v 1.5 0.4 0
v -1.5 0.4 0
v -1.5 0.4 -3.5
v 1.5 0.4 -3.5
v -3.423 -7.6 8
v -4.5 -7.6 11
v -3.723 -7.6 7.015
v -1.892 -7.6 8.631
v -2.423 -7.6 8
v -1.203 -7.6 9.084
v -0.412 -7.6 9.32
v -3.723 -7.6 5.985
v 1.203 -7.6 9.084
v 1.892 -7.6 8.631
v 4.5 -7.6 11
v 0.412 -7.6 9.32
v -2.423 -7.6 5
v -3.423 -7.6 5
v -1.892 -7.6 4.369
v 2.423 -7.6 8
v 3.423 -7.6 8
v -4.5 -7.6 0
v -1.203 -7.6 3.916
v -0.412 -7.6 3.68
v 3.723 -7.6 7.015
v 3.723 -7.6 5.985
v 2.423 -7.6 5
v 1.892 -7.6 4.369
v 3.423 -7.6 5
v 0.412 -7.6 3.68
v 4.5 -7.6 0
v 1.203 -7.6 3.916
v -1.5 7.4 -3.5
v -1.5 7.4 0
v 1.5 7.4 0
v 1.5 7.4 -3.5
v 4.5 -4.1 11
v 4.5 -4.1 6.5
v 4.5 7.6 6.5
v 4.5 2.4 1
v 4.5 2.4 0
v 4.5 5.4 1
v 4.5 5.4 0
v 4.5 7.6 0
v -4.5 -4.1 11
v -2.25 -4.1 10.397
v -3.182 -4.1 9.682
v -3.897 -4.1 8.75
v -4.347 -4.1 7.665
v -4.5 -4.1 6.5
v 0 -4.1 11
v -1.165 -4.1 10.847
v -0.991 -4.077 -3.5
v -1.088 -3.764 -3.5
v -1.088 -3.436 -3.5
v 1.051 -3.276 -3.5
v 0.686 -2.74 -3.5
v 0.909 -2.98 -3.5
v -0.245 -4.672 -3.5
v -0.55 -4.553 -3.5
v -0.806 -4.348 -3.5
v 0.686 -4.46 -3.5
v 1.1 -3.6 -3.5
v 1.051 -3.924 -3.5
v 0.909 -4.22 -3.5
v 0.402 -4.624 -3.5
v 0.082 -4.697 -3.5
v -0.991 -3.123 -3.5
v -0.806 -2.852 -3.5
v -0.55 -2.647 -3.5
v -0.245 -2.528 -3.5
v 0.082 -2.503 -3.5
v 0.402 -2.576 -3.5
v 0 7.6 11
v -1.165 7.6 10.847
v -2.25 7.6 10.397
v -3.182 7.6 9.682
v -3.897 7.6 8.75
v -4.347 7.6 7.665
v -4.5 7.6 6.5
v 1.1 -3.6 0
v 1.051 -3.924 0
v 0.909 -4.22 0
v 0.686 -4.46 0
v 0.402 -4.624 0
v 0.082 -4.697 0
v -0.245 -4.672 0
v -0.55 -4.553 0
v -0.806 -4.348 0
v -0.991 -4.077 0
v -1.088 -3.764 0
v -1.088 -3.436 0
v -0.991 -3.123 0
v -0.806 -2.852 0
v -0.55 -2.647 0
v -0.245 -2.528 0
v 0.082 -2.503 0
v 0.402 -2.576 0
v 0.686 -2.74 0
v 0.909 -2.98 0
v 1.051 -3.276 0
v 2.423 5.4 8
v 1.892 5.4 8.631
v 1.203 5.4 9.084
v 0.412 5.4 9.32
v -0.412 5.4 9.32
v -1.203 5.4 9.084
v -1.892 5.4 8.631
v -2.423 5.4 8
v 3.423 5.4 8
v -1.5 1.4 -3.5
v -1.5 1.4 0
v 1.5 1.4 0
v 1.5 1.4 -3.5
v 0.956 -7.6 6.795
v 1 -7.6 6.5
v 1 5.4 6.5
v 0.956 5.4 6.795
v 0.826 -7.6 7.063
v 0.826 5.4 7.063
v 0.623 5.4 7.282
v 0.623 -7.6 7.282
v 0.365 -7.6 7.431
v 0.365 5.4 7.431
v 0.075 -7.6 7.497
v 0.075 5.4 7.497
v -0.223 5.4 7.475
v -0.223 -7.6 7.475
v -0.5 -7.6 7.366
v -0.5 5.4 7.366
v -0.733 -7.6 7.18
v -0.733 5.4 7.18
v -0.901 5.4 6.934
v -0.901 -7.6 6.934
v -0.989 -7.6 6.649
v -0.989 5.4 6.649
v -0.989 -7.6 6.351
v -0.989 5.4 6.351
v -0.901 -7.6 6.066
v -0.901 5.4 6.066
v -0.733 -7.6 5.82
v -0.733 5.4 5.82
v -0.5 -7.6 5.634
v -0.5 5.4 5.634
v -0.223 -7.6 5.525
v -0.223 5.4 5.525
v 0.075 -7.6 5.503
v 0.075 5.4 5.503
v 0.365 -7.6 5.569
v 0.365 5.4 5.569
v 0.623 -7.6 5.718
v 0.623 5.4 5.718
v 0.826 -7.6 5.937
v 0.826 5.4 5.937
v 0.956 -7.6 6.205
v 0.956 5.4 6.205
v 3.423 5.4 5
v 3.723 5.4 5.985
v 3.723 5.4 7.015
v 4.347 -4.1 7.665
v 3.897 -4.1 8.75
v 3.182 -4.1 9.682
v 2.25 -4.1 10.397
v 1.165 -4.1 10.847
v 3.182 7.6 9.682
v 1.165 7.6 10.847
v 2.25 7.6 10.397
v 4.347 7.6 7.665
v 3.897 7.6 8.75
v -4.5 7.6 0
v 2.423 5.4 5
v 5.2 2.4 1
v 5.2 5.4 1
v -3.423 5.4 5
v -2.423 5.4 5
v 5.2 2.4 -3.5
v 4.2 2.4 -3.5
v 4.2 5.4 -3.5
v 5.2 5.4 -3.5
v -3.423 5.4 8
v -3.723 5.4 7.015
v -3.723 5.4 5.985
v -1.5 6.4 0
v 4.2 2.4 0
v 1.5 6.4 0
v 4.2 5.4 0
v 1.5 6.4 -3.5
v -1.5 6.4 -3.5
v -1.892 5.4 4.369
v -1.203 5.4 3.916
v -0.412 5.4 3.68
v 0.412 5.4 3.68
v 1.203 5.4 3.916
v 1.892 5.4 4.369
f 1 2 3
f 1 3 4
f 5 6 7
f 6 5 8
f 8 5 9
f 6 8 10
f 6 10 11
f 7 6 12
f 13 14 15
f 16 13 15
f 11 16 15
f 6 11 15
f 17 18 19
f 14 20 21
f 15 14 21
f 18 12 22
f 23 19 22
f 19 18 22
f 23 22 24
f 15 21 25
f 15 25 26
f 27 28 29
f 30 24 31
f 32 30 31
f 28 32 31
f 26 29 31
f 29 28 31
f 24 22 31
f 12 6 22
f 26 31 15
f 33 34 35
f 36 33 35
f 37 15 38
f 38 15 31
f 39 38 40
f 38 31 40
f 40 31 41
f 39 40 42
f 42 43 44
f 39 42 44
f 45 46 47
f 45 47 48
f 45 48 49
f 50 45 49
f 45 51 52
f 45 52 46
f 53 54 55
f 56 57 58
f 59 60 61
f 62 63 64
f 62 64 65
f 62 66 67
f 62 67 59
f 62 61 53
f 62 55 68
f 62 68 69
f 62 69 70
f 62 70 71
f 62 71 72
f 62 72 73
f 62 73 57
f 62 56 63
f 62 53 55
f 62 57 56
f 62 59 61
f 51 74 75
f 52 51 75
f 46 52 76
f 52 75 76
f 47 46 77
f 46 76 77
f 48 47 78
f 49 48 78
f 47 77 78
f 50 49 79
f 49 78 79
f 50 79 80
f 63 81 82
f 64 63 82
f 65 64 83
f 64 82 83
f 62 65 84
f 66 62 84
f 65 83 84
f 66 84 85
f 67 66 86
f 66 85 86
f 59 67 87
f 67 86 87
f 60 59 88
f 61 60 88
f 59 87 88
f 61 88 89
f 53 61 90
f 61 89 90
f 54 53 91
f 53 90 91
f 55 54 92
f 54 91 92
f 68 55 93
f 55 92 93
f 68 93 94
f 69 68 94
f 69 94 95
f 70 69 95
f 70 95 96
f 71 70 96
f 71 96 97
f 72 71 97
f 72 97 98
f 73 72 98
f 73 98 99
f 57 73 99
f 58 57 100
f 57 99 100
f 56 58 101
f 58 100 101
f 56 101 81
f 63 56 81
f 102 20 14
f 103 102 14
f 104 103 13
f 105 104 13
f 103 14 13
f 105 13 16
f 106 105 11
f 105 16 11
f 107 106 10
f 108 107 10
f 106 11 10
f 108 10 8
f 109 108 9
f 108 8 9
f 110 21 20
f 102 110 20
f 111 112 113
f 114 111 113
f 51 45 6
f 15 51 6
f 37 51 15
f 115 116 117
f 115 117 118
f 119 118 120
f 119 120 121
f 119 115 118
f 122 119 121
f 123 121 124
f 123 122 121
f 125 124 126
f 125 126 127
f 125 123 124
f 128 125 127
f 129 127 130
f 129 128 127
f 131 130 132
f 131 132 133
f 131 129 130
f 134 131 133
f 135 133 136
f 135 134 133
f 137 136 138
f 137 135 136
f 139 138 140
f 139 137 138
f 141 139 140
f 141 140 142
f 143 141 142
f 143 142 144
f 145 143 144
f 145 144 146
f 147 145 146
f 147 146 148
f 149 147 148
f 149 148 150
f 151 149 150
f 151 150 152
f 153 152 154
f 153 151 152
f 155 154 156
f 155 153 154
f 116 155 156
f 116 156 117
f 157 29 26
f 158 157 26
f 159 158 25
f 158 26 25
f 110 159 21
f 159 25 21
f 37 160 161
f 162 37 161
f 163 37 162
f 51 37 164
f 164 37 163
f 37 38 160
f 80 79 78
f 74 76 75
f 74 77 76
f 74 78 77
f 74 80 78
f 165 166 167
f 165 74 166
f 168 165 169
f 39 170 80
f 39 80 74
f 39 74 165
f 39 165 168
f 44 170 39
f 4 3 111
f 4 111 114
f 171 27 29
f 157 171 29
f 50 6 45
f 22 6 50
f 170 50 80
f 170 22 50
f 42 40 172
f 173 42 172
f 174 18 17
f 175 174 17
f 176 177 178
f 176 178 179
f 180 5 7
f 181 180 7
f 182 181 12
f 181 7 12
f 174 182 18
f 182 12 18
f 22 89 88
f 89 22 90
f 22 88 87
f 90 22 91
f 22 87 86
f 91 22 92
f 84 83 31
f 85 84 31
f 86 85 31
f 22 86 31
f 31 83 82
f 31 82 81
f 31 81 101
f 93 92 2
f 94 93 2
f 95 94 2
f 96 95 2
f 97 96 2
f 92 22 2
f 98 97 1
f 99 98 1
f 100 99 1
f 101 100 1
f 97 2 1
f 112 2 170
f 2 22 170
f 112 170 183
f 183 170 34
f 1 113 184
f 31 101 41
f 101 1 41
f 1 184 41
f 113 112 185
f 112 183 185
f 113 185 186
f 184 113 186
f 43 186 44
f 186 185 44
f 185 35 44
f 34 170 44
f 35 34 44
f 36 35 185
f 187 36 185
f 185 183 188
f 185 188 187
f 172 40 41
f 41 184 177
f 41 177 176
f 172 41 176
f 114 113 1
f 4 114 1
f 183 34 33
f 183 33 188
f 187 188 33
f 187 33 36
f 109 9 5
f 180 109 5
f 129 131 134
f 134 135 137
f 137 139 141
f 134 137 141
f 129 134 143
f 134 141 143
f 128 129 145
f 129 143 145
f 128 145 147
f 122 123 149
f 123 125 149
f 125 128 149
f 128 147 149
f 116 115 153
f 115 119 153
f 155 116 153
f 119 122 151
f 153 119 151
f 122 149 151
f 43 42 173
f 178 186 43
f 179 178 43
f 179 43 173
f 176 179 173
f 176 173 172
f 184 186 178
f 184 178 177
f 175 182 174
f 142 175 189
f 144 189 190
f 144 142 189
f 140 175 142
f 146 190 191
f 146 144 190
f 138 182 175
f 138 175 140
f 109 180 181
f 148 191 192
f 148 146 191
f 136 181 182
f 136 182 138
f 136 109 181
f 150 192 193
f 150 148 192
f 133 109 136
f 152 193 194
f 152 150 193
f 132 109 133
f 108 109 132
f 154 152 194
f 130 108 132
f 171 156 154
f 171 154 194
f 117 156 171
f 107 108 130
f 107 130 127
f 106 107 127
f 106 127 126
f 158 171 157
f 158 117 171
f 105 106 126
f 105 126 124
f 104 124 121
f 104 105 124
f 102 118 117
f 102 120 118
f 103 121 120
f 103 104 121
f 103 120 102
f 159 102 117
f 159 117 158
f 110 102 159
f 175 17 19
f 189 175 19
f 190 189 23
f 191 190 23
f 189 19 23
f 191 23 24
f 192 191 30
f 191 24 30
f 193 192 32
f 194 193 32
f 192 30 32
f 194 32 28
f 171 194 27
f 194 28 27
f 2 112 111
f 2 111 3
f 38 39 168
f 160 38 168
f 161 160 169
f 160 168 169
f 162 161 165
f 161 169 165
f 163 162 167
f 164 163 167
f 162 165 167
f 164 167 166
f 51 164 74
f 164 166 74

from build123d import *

# Parameters (mm, degrees)
F0_W          = 9
F0_H          = 15.2
F1_DEPTH      = 11
F3_DEPTH      = 11.7
F4_R          = 1
F5_DEPTH      = 13
F6_R          = 1.1
F6_W          = 3
F6_H          = 1
F6_W_2        = 1
F6_H_2        = 3
F7_DEPTH      = 3.5
F7_DEPTH_BACK = 1


with BuildPart() as f1:
    # F0 (on Top) → F1 (new body)
    with BuildSketch(Plane.XY):
        Rectangle(F0_W, F0_H)
    extrude(amount=F1_DEPTH)

    # F2 (on face) → F3 (cut)
    with BuildSketch(Plane(origin=(0, 7.6, 0), x_dir=(-1, 0, 0), z_dir=(0, 1, 0))):
        with BuildLine():
            ThreePointArc((-4.5, 6.5), (-3.181981, 9.681981), (0, 11))
            Line((0, 11), (-4.5, 11))
            Line((-4.5, 11), (-4.5, 6.5))
        make_face()
        with BuildLine():
            ThreePointArc((0, 11), (3.181981, 9.681981), (4.5, 6.5))
            Line((4.5, 6.5), (4.5, 11))
            Line((4.5, 11), (0, 11))
        make_face()
    extrude(amount=-F3_DEPTH, mode=Mode.SUBTRACT)

    # F4 (on face) → F5 (cut)
    with BuildSketch(Plane.XZ.offset(7.6)):
        with BuildLine():
            ThreePointArc((2.423324, 5), (2.741256, 5.720248), (2.85, 6.5))
            ThreePointArc((2.85, 6.5), (2.741256, 7.279752), (2.423324, 8))
            ThreePointArc((2.423324, 8), (0, 9.35), (-2.423324, 8))
            ThreePointArc((-2.423324, 8), (-2.85, 6.5), (-2.423324, 5))
            ThreePointArc((-2.423324, 5), (0, 3.65), (2.423324, 5))
        make_face()
        with Locations((0, 6.5)):
            Circle(F4_R, mode=Mode.SUBTRACT)
        with BuildLine():
            ThreePointArc((-2.423324, 5), (-2.85, 6.5), (-2.423324, 8))
            Line((-2.423324, 8), (-3.423324, 8))
            ThreePointArc((-3.423324, 8), (-3.761047, 6.5), (-3.423324, 5))
            Line((-3.423324, 5), (-2.423324, 5))
        make_face()
        with BuildLine():
            ThreePointArc((2.423324, 8), (2.741256, 7.279752), (2.85, 6.5))
            ThreePointArc((2.85, 6.5), (2.741256, 5.720248), (2.423324, 5))
            Line((2.423324, 5), (3.423324, 5))
            ThreePointArc((3.423324, 5), (3.761047, 6.5), (3.423324, 8))
            Line((3.423324, 8), (2.423324, 8))
        make_face()
    extrude(amount=-F5_DEPTH, mode=Mode.SUBTRACT)

    # F6 (on face) → F7 (join, two sides)
    with BuildSketch(Plane(origin=(0, 0, 0), x_dir=(1, 0, 0), z_dir=(0, 0, -1))) as f7_sk:
        with Locations((0, 3.6)):
            Circle(F6_R)
        with Locations((0, -0.9)):
            Rectangle(F6_W, F6_H)
        with Locations((0, -6.9)):
            Rectangle(F6_W, F6_H)
        with Locations((4.7, -3.9)):
            Rectangle(F6_W_2, F6_H_2)
    extrude(amount=F7_DEPTH)
    extrude(f7_sk.sketch, amount=-F7_DEPTH_BACK)


solid = f1.part
